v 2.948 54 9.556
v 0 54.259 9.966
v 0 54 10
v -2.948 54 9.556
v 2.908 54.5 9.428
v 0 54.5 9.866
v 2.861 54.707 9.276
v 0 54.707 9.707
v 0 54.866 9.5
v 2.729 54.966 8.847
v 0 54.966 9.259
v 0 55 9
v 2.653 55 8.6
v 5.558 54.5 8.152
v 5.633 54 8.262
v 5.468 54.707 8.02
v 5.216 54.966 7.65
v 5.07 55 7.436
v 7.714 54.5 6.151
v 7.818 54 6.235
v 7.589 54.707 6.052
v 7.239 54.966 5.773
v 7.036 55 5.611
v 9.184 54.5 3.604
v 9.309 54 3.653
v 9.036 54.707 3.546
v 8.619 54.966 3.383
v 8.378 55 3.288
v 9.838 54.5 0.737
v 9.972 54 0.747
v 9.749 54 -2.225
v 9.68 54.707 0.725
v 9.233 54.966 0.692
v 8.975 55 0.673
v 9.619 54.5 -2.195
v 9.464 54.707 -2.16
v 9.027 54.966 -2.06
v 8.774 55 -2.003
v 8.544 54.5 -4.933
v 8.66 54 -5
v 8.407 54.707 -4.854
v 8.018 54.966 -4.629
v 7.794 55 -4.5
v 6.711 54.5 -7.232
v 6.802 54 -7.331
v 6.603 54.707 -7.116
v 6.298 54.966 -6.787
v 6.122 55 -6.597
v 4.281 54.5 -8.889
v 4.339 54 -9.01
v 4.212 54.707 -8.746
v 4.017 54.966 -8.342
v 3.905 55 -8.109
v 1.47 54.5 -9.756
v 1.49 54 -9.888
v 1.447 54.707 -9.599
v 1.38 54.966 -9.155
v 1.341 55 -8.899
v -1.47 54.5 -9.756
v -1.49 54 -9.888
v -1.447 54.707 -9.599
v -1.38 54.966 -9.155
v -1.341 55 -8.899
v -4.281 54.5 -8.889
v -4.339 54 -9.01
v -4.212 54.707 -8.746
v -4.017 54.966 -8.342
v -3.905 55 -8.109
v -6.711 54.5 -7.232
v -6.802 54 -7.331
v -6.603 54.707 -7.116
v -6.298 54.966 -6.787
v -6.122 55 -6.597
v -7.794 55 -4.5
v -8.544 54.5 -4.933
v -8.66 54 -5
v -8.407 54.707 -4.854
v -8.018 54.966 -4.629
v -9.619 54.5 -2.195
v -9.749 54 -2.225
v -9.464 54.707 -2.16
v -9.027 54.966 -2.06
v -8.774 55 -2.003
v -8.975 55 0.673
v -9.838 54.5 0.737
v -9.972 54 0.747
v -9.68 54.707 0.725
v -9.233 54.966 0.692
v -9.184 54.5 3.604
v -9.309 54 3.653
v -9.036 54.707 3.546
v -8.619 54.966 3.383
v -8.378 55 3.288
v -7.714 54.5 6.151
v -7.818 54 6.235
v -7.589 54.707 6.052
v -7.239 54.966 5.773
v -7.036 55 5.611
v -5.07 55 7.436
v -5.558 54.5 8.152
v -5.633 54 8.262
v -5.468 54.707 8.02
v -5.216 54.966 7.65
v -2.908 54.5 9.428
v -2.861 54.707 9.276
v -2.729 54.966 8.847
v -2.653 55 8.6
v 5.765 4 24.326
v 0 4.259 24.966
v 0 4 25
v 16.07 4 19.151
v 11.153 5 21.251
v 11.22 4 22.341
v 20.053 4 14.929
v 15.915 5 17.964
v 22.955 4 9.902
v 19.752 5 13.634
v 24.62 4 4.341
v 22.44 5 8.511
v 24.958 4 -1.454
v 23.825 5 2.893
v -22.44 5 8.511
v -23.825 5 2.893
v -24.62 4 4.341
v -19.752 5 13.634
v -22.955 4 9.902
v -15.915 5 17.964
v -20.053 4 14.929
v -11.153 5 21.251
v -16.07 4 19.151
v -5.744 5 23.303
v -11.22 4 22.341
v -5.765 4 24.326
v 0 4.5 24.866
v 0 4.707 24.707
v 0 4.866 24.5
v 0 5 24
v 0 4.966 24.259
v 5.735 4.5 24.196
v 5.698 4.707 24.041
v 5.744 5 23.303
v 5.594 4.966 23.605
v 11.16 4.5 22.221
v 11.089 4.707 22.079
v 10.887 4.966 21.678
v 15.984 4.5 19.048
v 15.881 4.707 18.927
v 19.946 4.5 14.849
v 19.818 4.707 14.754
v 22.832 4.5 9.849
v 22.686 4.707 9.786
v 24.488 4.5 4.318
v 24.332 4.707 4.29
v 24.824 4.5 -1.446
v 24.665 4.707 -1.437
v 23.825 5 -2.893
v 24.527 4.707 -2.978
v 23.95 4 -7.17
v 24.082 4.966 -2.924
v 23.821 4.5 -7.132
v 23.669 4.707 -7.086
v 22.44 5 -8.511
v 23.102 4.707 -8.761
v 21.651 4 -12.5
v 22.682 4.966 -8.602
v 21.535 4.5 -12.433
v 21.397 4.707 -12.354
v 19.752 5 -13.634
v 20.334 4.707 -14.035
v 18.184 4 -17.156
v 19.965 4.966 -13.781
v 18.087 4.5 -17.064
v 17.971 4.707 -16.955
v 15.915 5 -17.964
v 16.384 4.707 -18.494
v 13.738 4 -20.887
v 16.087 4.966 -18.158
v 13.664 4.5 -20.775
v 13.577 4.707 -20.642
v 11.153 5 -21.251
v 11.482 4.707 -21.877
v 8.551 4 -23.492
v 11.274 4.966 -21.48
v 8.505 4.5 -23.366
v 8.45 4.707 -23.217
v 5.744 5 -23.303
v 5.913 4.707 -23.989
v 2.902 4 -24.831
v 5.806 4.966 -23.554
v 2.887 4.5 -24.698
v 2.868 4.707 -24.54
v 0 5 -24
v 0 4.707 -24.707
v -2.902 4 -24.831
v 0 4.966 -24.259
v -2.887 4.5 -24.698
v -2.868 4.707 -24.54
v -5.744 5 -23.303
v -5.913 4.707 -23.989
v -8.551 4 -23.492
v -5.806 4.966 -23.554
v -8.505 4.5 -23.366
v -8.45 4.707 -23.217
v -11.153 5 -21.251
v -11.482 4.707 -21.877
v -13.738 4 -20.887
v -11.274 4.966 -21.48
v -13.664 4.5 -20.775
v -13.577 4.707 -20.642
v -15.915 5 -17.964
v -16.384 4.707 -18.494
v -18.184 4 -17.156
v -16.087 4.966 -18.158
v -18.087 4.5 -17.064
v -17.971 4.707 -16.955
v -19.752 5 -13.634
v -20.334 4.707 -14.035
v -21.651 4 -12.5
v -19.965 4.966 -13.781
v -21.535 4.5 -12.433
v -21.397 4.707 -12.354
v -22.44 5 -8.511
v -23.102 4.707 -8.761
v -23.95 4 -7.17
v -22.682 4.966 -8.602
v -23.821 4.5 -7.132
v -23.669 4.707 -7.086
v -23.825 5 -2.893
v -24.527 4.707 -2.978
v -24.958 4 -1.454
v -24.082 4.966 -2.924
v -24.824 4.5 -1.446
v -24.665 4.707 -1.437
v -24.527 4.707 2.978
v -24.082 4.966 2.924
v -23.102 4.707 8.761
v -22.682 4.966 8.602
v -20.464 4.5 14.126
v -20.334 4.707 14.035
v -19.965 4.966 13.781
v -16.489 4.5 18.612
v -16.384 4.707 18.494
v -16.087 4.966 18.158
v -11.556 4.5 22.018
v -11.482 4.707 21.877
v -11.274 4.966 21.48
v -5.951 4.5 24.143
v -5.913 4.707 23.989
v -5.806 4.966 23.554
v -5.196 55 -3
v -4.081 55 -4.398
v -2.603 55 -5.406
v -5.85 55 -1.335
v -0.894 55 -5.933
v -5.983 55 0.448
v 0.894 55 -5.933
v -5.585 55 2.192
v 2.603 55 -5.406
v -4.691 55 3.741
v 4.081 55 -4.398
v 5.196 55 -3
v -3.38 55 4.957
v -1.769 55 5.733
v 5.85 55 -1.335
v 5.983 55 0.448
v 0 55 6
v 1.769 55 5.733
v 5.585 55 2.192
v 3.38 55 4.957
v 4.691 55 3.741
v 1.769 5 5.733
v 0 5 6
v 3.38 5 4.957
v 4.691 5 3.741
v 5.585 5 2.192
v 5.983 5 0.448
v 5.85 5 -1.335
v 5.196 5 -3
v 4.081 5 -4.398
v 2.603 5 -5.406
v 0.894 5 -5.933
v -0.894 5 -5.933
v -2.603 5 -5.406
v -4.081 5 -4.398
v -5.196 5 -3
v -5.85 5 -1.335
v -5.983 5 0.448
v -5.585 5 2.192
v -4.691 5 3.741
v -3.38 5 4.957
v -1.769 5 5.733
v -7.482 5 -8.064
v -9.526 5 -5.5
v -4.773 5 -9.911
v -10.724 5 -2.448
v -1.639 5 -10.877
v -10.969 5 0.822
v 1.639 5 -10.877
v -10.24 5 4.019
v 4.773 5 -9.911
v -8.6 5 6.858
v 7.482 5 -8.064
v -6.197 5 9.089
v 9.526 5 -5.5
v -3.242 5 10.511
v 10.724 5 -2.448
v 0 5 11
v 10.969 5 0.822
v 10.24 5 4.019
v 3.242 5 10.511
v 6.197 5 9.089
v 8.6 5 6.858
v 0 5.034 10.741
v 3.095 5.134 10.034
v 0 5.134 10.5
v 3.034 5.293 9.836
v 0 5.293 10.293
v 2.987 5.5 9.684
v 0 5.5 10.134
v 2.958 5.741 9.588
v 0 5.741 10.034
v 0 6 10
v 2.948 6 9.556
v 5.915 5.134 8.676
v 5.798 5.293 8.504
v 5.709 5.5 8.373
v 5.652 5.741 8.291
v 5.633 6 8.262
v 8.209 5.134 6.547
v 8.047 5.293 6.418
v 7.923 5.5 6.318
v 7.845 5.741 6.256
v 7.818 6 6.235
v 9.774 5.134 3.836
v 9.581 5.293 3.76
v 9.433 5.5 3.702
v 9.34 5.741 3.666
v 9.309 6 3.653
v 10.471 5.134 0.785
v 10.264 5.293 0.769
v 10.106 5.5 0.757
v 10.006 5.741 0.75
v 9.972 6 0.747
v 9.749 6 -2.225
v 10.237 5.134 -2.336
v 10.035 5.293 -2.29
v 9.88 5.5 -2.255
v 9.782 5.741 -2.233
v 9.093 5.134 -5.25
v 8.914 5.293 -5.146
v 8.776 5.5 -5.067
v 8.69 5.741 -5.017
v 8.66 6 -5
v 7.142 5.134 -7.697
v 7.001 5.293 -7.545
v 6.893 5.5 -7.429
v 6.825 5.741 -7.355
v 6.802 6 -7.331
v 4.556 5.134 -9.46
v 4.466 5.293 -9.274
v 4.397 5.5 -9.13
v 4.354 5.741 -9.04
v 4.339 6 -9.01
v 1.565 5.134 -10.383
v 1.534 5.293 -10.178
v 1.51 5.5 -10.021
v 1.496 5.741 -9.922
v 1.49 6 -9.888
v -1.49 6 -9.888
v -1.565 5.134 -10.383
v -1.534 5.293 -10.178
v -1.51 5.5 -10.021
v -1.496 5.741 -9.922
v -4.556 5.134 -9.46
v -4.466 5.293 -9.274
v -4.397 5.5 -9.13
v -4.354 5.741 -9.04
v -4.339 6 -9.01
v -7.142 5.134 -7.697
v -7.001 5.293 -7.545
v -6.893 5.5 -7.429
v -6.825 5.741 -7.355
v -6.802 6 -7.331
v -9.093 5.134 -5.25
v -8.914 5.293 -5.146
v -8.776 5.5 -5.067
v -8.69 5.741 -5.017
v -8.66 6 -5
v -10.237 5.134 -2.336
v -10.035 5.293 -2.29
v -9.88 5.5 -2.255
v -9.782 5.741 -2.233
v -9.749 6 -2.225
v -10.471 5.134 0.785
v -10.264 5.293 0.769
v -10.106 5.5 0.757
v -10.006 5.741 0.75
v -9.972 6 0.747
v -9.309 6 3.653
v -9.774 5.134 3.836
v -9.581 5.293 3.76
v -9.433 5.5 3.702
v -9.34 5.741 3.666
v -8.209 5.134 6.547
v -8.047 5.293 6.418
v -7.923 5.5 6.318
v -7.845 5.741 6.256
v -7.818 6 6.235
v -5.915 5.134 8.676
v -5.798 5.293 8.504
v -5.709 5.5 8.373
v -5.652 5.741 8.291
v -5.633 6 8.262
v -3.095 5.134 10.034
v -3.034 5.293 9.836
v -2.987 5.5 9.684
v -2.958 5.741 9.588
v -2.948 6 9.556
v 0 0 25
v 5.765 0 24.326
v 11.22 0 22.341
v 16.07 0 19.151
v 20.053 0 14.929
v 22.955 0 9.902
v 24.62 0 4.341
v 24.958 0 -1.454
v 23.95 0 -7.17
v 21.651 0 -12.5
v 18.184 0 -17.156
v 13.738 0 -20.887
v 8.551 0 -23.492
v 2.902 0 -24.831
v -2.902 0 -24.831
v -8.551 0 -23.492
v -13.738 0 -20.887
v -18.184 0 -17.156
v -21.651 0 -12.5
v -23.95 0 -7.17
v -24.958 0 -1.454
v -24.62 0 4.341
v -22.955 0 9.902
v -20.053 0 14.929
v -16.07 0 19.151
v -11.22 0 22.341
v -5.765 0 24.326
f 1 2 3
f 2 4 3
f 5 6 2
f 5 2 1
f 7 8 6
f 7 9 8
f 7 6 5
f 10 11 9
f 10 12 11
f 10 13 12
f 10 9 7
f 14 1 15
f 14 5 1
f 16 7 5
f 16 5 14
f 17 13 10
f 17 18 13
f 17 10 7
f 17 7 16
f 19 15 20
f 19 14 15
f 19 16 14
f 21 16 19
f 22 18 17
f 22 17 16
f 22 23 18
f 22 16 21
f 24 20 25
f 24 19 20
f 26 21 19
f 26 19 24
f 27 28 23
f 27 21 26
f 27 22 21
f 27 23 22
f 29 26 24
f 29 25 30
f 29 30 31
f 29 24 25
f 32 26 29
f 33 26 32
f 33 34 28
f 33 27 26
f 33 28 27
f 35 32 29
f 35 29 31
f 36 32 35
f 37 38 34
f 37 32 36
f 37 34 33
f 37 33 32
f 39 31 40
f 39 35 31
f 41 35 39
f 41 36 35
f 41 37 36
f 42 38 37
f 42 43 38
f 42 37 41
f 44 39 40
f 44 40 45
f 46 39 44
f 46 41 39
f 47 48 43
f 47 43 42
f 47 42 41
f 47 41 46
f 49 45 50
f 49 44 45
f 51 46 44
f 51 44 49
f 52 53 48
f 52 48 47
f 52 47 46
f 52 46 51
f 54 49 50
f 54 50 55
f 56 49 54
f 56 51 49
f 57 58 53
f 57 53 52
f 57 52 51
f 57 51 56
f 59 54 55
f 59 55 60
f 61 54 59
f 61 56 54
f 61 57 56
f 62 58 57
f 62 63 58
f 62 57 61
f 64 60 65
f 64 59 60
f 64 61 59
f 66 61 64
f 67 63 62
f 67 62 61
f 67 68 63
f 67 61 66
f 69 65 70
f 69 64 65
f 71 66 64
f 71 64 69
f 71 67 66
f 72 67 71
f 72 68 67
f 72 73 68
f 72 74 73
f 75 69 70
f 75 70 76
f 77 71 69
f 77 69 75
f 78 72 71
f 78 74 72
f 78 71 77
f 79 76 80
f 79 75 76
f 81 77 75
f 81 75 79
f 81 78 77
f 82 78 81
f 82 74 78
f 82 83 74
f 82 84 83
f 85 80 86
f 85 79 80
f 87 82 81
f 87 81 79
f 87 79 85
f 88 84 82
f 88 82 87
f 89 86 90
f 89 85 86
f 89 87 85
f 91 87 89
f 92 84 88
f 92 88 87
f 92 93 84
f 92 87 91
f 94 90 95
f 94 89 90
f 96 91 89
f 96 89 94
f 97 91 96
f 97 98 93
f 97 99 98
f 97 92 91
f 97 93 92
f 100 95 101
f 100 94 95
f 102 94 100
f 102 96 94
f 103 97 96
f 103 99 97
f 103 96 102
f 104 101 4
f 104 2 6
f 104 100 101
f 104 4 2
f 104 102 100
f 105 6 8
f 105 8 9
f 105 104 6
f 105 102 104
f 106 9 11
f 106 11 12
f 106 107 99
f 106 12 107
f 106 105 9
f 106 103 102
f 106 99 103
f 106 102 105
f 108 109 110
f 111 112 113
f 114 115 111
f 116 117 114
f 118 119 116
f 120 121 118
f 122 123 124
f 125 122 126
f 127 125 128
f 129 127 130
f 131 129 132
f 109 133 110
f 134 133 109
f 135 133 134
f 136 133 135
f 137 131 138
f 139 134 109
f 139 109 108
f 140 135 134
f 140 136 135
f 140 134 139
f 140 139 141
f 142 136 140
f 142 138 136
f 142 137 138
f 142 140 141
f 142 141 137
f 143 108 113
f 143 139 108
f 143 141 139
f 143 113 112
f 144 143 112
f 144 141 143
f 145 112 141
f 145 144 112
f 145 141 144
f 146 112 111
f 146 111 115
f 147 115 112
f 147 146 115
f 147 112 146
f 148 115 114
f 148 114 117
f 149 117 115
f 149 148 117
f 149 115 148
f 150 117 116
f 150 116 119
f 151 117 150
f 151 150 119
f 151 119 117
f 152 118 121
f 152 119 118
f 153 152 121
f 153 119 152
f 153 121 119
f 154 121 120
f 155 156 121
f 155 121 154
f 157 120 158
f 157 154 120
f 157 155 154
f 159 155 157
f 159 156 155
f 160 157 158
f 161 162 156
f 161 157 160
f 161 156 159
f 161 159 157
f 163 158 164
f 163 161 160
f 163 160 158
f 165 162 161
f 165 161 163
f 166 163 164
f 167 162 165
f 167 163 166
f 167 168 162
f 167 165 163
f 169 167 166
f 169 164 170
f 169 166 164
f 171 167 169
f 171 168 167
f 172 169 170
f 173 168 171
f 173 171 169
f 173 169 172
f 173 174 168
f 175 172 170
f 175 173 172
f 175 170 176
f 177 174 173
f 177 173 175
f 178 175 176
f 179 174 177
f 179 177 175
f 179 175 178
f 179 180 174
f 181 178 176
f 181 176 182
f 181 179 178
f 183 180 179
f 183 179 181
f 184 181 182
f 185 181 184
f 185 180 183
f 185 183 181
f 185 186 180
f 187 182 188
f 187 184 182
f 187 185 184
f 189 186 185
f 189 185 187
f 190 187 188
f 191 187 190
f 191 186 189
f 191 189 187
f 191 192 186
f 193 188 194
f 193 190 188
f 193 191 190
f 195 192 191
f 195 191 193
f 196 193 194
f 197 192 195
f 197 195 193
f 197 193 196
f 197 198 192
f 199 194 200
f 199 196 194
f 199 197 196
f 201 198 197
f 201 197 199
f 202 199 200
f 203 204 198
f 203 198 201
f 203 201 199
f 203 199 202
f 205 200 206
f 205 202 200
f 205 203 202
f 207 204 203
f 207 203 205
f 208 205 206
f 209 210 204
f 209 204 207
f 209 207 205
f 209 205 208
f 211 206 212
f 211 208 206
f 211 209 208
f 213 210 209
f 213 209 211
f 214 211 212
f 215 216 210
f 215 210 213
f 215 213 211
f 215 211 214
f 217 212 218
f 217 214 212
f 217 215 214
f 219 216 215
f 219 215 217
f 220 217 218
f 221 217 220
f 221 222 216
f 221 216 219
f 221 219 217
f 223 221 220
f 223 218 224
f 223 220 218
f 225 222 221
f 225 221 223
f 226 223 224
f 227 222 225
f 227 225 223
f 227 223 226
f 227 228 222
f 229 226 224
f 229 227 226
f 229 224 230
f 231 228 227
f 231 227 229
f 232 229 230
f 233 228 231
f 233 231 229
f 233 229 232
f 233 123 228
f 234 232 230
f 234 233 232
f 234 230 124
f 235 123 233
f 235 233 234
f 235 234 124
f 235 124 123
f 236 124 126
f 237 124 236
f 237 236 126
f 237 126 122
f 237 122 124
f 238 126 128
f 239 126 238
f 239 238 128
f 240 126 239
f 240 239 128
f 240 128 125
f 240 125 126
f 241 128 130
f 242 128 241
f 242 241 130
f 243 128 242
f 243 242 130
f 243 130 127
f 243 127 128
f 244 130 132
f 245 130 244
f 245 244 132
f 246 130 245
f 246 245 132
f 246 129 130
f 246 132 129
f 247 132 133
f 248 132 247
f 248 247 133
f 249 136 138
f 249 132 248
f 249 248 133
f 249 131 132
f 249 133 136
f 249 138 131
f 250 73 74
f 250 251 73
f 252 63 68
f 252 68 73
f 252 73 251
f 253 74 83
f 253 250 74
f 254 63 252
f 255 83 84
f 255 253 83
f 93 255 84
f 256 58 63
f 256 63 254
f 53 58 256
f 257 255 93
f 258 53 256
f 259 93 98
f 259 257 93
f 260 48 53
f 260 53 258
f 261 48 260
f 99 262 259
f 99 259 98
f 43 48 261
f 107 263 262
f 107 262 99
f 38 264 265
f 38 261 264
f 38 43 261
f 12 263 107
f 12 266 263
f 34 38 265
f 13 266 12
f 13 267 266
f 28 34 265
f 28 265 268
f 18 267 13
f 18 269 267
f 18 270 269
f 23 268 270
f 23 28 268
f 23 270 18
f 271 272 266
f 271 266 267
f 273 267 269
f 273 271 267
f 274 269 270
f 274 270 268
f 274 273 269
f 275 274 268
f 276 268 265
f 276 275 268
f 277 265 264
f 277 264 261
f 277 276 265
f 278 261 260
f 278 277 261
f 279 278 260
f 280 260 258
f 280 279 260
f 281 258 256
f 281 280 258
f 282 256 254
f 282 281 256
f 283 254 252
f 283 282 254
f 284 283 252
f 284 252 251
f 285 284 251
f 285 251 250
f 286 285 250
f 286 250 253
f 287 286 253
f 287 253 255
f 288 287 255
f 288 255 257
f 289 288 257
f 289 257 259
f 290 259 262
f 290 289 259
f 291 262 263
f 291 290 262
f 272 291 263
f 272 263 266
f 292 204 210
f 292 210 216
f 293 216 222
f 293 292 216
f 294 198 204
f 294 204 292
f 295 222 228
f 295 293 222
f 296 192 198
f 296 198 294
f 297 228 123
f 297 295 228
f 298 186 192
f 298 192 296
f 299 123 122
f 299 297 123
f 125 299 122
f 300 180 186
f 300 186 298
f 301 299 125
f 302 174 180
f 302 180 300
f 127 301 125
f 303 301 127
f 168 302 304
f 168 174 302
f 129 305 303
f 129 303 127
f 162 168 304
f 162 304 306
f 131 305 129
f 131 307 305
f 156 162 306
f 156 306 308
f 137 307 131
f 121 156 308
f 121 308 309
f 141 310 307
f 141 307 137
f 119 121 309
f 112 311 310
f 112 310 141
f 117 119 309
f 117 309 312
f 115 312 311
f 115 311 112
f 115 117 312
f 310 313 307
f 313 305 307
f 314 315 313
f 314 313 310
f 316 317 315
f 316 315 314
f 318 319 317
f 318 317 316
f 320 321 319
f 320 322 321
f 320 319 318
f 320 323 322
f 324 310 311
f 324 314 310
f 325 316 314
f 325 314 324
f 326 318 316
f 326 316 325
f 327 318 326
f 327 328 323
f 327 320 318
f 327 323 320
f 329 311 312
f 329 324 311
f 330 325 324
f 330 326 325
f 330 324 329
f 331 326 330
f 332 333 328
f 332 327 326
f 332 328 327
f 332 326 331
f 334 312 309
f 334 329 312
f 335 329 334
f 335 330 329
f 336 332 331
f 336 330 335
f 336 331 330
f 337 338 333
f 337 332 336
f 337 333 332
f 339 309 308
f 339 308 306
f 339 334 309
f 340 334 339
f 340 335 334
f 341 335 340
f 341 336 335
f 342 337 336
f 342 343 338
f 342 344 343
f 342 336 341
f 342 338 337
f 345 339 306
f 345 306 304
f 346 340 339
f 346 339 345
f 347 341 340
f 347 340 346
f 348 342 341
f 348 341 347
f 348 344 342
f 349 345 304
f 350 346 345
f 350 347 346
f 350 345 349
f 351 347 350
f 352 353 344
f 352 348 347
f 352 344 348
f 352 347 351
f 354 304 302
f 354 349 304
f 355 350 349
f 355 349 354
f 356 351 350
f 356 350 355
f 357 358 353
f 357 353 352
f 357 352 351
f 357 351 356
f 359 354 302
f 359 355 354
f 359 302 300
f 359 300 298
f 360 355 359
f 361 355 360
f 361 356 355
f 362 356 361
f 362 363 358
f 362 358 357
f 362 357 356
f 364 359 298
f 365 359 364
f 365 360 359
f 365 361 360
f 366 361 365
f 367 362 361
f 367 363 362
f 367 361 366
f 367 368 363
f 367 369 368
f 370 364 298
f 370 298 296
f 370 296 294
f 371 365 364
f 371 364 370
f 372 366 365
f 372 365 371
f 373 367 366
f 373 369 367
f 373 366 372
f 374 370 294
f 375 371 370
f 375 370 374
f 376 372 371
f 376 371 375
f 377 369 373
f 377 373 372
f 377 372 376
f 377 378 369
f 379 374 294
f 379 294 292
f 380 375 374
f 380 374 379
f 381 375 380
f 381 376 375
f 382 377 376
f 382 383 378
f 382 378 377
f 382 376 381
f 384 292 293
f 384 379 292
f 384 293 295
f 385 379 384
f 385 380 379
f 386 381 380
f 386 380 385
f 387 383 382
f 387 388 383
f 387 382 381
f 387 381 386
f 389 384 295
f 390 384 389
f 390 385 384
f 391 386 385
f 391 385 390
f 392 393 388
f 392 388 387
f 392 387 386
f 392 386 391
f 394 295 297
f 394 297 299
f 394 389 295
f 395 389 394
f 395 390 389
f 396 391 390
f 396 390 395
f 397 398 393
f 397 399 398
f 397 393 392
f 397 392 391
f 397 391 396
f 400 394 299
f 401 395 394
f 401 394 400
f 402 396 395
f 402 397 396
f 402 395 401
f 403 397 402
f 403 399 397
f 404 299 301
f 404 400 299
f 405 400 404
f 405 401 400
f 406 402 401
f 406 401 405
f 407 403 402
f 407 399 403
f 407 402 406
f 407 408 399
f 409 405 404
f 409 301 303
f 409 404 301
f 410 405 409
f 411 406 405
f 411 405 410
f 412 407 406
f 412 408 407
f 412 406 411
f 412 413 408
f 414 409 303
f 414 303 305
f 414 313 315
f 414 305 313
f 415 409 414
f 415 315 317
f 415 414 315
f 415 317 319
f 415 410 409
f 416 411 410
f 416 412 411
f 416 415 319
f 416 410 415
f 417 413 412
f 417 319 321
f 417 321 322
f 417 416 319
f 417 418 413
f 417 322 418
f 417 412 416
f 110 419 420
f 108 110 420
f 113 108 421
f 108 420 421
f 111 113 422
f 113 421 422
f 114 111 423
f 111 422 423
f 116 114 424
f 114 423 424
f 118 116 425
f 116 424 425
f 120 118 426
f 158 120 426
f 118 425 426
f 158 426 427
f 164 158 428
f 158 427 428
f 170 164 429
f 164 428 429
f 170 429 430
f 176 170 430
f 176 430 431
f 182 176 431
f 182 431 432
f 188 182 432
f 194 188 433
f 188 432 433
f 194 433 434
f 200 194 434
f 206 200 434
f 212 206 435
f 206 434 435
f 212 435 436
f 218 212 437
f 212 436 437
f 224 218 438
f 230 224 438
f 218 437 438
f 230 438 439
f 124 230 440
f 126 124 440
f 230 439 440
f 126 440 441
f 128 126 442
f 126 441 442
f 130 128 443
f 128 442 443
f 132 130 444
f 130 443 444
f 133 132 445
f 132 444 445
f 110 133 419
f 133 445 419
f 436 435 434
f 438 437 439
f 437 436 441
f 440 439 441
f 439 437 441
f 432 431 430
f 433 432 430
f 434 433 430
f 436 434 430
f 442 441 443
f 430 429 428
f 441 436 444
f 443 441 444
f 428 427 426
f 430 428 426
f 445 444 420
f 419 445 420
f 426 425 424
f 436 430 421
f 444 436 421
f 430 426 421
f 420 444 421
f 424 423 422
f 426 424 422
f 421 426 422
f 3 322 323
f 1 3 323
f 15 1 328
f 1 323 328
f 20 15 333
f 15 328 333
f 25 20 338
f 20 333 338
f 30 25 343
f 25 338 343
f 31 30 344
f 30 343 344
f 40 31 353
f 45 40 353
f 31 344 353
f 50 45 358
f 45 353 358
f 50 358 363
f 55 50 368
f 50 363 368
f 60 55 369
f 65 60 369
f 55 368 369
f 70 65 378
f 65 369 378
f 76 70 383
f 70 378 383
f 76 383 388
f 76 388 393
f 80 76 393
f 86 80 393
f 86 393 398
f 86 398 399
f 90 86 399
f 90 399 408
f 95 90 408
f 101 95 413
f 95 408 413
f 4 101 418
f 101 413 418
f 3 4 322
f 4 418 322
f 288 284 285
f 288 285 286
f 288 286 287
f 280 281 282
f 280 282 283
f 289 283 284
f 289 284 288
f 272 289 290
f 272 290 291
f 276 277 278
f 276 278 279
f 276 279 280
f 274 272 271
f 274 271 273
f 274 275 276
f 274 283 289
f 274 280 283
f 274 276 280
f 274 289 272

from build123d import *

# Parameters (mm, degrees)
SKETCH1_R           = 25
BOSS_EXTRUDE1_DEPTH = 5
SKETCH2_R           = 10
SKETCH2_R_2         = 6
BOSS_EXTRUDE2_DEPTH = 50
FILLET1_R           = 1


with BuildPart() as part:
    # Sketch1 → Boss-Extrude1 (new body)
    with BuildSketch(Plane(origin=(0, 0, 0), x_dir=(1, 0, 0), z_dir=(0, 1, 0))):
        with Locations(Location((0, 0, 0), (0, 0, 270))):
            Circle(SKETCH1_R)
    extrude(amount=BOSS_EXTRUDE1_DEPTH)

    # Sketch2 → Boss-Extrude2 (add)
    with BuildSketch(Plane(origin=(0, 5, 0), x_dir=(1, 0, 0), z_dir=(0, 1, 0))):
        with Locations(Location((0, 0, 0), (0, 0, 270))):
            Circle(SKETCH2_R)
        with Locations(Location((0, 0, 0), (0, 0, 270))):
            Circle(SKETCH2_R_2, mode=Mode.SUBTRACT)
    extrude(amount=BOSS_EXTRUDE2_DEPTH)

    # Fillet1
    fillet1_edges = [part.edges().sort_by_distance(p)[0] for p in [
        (0, 5, -25),
        (0, 55, -10),
        (0, 5, -10),
    ]]
    fillet(fillet1_edges, radius=FILLET1_R)


solid = part.part
